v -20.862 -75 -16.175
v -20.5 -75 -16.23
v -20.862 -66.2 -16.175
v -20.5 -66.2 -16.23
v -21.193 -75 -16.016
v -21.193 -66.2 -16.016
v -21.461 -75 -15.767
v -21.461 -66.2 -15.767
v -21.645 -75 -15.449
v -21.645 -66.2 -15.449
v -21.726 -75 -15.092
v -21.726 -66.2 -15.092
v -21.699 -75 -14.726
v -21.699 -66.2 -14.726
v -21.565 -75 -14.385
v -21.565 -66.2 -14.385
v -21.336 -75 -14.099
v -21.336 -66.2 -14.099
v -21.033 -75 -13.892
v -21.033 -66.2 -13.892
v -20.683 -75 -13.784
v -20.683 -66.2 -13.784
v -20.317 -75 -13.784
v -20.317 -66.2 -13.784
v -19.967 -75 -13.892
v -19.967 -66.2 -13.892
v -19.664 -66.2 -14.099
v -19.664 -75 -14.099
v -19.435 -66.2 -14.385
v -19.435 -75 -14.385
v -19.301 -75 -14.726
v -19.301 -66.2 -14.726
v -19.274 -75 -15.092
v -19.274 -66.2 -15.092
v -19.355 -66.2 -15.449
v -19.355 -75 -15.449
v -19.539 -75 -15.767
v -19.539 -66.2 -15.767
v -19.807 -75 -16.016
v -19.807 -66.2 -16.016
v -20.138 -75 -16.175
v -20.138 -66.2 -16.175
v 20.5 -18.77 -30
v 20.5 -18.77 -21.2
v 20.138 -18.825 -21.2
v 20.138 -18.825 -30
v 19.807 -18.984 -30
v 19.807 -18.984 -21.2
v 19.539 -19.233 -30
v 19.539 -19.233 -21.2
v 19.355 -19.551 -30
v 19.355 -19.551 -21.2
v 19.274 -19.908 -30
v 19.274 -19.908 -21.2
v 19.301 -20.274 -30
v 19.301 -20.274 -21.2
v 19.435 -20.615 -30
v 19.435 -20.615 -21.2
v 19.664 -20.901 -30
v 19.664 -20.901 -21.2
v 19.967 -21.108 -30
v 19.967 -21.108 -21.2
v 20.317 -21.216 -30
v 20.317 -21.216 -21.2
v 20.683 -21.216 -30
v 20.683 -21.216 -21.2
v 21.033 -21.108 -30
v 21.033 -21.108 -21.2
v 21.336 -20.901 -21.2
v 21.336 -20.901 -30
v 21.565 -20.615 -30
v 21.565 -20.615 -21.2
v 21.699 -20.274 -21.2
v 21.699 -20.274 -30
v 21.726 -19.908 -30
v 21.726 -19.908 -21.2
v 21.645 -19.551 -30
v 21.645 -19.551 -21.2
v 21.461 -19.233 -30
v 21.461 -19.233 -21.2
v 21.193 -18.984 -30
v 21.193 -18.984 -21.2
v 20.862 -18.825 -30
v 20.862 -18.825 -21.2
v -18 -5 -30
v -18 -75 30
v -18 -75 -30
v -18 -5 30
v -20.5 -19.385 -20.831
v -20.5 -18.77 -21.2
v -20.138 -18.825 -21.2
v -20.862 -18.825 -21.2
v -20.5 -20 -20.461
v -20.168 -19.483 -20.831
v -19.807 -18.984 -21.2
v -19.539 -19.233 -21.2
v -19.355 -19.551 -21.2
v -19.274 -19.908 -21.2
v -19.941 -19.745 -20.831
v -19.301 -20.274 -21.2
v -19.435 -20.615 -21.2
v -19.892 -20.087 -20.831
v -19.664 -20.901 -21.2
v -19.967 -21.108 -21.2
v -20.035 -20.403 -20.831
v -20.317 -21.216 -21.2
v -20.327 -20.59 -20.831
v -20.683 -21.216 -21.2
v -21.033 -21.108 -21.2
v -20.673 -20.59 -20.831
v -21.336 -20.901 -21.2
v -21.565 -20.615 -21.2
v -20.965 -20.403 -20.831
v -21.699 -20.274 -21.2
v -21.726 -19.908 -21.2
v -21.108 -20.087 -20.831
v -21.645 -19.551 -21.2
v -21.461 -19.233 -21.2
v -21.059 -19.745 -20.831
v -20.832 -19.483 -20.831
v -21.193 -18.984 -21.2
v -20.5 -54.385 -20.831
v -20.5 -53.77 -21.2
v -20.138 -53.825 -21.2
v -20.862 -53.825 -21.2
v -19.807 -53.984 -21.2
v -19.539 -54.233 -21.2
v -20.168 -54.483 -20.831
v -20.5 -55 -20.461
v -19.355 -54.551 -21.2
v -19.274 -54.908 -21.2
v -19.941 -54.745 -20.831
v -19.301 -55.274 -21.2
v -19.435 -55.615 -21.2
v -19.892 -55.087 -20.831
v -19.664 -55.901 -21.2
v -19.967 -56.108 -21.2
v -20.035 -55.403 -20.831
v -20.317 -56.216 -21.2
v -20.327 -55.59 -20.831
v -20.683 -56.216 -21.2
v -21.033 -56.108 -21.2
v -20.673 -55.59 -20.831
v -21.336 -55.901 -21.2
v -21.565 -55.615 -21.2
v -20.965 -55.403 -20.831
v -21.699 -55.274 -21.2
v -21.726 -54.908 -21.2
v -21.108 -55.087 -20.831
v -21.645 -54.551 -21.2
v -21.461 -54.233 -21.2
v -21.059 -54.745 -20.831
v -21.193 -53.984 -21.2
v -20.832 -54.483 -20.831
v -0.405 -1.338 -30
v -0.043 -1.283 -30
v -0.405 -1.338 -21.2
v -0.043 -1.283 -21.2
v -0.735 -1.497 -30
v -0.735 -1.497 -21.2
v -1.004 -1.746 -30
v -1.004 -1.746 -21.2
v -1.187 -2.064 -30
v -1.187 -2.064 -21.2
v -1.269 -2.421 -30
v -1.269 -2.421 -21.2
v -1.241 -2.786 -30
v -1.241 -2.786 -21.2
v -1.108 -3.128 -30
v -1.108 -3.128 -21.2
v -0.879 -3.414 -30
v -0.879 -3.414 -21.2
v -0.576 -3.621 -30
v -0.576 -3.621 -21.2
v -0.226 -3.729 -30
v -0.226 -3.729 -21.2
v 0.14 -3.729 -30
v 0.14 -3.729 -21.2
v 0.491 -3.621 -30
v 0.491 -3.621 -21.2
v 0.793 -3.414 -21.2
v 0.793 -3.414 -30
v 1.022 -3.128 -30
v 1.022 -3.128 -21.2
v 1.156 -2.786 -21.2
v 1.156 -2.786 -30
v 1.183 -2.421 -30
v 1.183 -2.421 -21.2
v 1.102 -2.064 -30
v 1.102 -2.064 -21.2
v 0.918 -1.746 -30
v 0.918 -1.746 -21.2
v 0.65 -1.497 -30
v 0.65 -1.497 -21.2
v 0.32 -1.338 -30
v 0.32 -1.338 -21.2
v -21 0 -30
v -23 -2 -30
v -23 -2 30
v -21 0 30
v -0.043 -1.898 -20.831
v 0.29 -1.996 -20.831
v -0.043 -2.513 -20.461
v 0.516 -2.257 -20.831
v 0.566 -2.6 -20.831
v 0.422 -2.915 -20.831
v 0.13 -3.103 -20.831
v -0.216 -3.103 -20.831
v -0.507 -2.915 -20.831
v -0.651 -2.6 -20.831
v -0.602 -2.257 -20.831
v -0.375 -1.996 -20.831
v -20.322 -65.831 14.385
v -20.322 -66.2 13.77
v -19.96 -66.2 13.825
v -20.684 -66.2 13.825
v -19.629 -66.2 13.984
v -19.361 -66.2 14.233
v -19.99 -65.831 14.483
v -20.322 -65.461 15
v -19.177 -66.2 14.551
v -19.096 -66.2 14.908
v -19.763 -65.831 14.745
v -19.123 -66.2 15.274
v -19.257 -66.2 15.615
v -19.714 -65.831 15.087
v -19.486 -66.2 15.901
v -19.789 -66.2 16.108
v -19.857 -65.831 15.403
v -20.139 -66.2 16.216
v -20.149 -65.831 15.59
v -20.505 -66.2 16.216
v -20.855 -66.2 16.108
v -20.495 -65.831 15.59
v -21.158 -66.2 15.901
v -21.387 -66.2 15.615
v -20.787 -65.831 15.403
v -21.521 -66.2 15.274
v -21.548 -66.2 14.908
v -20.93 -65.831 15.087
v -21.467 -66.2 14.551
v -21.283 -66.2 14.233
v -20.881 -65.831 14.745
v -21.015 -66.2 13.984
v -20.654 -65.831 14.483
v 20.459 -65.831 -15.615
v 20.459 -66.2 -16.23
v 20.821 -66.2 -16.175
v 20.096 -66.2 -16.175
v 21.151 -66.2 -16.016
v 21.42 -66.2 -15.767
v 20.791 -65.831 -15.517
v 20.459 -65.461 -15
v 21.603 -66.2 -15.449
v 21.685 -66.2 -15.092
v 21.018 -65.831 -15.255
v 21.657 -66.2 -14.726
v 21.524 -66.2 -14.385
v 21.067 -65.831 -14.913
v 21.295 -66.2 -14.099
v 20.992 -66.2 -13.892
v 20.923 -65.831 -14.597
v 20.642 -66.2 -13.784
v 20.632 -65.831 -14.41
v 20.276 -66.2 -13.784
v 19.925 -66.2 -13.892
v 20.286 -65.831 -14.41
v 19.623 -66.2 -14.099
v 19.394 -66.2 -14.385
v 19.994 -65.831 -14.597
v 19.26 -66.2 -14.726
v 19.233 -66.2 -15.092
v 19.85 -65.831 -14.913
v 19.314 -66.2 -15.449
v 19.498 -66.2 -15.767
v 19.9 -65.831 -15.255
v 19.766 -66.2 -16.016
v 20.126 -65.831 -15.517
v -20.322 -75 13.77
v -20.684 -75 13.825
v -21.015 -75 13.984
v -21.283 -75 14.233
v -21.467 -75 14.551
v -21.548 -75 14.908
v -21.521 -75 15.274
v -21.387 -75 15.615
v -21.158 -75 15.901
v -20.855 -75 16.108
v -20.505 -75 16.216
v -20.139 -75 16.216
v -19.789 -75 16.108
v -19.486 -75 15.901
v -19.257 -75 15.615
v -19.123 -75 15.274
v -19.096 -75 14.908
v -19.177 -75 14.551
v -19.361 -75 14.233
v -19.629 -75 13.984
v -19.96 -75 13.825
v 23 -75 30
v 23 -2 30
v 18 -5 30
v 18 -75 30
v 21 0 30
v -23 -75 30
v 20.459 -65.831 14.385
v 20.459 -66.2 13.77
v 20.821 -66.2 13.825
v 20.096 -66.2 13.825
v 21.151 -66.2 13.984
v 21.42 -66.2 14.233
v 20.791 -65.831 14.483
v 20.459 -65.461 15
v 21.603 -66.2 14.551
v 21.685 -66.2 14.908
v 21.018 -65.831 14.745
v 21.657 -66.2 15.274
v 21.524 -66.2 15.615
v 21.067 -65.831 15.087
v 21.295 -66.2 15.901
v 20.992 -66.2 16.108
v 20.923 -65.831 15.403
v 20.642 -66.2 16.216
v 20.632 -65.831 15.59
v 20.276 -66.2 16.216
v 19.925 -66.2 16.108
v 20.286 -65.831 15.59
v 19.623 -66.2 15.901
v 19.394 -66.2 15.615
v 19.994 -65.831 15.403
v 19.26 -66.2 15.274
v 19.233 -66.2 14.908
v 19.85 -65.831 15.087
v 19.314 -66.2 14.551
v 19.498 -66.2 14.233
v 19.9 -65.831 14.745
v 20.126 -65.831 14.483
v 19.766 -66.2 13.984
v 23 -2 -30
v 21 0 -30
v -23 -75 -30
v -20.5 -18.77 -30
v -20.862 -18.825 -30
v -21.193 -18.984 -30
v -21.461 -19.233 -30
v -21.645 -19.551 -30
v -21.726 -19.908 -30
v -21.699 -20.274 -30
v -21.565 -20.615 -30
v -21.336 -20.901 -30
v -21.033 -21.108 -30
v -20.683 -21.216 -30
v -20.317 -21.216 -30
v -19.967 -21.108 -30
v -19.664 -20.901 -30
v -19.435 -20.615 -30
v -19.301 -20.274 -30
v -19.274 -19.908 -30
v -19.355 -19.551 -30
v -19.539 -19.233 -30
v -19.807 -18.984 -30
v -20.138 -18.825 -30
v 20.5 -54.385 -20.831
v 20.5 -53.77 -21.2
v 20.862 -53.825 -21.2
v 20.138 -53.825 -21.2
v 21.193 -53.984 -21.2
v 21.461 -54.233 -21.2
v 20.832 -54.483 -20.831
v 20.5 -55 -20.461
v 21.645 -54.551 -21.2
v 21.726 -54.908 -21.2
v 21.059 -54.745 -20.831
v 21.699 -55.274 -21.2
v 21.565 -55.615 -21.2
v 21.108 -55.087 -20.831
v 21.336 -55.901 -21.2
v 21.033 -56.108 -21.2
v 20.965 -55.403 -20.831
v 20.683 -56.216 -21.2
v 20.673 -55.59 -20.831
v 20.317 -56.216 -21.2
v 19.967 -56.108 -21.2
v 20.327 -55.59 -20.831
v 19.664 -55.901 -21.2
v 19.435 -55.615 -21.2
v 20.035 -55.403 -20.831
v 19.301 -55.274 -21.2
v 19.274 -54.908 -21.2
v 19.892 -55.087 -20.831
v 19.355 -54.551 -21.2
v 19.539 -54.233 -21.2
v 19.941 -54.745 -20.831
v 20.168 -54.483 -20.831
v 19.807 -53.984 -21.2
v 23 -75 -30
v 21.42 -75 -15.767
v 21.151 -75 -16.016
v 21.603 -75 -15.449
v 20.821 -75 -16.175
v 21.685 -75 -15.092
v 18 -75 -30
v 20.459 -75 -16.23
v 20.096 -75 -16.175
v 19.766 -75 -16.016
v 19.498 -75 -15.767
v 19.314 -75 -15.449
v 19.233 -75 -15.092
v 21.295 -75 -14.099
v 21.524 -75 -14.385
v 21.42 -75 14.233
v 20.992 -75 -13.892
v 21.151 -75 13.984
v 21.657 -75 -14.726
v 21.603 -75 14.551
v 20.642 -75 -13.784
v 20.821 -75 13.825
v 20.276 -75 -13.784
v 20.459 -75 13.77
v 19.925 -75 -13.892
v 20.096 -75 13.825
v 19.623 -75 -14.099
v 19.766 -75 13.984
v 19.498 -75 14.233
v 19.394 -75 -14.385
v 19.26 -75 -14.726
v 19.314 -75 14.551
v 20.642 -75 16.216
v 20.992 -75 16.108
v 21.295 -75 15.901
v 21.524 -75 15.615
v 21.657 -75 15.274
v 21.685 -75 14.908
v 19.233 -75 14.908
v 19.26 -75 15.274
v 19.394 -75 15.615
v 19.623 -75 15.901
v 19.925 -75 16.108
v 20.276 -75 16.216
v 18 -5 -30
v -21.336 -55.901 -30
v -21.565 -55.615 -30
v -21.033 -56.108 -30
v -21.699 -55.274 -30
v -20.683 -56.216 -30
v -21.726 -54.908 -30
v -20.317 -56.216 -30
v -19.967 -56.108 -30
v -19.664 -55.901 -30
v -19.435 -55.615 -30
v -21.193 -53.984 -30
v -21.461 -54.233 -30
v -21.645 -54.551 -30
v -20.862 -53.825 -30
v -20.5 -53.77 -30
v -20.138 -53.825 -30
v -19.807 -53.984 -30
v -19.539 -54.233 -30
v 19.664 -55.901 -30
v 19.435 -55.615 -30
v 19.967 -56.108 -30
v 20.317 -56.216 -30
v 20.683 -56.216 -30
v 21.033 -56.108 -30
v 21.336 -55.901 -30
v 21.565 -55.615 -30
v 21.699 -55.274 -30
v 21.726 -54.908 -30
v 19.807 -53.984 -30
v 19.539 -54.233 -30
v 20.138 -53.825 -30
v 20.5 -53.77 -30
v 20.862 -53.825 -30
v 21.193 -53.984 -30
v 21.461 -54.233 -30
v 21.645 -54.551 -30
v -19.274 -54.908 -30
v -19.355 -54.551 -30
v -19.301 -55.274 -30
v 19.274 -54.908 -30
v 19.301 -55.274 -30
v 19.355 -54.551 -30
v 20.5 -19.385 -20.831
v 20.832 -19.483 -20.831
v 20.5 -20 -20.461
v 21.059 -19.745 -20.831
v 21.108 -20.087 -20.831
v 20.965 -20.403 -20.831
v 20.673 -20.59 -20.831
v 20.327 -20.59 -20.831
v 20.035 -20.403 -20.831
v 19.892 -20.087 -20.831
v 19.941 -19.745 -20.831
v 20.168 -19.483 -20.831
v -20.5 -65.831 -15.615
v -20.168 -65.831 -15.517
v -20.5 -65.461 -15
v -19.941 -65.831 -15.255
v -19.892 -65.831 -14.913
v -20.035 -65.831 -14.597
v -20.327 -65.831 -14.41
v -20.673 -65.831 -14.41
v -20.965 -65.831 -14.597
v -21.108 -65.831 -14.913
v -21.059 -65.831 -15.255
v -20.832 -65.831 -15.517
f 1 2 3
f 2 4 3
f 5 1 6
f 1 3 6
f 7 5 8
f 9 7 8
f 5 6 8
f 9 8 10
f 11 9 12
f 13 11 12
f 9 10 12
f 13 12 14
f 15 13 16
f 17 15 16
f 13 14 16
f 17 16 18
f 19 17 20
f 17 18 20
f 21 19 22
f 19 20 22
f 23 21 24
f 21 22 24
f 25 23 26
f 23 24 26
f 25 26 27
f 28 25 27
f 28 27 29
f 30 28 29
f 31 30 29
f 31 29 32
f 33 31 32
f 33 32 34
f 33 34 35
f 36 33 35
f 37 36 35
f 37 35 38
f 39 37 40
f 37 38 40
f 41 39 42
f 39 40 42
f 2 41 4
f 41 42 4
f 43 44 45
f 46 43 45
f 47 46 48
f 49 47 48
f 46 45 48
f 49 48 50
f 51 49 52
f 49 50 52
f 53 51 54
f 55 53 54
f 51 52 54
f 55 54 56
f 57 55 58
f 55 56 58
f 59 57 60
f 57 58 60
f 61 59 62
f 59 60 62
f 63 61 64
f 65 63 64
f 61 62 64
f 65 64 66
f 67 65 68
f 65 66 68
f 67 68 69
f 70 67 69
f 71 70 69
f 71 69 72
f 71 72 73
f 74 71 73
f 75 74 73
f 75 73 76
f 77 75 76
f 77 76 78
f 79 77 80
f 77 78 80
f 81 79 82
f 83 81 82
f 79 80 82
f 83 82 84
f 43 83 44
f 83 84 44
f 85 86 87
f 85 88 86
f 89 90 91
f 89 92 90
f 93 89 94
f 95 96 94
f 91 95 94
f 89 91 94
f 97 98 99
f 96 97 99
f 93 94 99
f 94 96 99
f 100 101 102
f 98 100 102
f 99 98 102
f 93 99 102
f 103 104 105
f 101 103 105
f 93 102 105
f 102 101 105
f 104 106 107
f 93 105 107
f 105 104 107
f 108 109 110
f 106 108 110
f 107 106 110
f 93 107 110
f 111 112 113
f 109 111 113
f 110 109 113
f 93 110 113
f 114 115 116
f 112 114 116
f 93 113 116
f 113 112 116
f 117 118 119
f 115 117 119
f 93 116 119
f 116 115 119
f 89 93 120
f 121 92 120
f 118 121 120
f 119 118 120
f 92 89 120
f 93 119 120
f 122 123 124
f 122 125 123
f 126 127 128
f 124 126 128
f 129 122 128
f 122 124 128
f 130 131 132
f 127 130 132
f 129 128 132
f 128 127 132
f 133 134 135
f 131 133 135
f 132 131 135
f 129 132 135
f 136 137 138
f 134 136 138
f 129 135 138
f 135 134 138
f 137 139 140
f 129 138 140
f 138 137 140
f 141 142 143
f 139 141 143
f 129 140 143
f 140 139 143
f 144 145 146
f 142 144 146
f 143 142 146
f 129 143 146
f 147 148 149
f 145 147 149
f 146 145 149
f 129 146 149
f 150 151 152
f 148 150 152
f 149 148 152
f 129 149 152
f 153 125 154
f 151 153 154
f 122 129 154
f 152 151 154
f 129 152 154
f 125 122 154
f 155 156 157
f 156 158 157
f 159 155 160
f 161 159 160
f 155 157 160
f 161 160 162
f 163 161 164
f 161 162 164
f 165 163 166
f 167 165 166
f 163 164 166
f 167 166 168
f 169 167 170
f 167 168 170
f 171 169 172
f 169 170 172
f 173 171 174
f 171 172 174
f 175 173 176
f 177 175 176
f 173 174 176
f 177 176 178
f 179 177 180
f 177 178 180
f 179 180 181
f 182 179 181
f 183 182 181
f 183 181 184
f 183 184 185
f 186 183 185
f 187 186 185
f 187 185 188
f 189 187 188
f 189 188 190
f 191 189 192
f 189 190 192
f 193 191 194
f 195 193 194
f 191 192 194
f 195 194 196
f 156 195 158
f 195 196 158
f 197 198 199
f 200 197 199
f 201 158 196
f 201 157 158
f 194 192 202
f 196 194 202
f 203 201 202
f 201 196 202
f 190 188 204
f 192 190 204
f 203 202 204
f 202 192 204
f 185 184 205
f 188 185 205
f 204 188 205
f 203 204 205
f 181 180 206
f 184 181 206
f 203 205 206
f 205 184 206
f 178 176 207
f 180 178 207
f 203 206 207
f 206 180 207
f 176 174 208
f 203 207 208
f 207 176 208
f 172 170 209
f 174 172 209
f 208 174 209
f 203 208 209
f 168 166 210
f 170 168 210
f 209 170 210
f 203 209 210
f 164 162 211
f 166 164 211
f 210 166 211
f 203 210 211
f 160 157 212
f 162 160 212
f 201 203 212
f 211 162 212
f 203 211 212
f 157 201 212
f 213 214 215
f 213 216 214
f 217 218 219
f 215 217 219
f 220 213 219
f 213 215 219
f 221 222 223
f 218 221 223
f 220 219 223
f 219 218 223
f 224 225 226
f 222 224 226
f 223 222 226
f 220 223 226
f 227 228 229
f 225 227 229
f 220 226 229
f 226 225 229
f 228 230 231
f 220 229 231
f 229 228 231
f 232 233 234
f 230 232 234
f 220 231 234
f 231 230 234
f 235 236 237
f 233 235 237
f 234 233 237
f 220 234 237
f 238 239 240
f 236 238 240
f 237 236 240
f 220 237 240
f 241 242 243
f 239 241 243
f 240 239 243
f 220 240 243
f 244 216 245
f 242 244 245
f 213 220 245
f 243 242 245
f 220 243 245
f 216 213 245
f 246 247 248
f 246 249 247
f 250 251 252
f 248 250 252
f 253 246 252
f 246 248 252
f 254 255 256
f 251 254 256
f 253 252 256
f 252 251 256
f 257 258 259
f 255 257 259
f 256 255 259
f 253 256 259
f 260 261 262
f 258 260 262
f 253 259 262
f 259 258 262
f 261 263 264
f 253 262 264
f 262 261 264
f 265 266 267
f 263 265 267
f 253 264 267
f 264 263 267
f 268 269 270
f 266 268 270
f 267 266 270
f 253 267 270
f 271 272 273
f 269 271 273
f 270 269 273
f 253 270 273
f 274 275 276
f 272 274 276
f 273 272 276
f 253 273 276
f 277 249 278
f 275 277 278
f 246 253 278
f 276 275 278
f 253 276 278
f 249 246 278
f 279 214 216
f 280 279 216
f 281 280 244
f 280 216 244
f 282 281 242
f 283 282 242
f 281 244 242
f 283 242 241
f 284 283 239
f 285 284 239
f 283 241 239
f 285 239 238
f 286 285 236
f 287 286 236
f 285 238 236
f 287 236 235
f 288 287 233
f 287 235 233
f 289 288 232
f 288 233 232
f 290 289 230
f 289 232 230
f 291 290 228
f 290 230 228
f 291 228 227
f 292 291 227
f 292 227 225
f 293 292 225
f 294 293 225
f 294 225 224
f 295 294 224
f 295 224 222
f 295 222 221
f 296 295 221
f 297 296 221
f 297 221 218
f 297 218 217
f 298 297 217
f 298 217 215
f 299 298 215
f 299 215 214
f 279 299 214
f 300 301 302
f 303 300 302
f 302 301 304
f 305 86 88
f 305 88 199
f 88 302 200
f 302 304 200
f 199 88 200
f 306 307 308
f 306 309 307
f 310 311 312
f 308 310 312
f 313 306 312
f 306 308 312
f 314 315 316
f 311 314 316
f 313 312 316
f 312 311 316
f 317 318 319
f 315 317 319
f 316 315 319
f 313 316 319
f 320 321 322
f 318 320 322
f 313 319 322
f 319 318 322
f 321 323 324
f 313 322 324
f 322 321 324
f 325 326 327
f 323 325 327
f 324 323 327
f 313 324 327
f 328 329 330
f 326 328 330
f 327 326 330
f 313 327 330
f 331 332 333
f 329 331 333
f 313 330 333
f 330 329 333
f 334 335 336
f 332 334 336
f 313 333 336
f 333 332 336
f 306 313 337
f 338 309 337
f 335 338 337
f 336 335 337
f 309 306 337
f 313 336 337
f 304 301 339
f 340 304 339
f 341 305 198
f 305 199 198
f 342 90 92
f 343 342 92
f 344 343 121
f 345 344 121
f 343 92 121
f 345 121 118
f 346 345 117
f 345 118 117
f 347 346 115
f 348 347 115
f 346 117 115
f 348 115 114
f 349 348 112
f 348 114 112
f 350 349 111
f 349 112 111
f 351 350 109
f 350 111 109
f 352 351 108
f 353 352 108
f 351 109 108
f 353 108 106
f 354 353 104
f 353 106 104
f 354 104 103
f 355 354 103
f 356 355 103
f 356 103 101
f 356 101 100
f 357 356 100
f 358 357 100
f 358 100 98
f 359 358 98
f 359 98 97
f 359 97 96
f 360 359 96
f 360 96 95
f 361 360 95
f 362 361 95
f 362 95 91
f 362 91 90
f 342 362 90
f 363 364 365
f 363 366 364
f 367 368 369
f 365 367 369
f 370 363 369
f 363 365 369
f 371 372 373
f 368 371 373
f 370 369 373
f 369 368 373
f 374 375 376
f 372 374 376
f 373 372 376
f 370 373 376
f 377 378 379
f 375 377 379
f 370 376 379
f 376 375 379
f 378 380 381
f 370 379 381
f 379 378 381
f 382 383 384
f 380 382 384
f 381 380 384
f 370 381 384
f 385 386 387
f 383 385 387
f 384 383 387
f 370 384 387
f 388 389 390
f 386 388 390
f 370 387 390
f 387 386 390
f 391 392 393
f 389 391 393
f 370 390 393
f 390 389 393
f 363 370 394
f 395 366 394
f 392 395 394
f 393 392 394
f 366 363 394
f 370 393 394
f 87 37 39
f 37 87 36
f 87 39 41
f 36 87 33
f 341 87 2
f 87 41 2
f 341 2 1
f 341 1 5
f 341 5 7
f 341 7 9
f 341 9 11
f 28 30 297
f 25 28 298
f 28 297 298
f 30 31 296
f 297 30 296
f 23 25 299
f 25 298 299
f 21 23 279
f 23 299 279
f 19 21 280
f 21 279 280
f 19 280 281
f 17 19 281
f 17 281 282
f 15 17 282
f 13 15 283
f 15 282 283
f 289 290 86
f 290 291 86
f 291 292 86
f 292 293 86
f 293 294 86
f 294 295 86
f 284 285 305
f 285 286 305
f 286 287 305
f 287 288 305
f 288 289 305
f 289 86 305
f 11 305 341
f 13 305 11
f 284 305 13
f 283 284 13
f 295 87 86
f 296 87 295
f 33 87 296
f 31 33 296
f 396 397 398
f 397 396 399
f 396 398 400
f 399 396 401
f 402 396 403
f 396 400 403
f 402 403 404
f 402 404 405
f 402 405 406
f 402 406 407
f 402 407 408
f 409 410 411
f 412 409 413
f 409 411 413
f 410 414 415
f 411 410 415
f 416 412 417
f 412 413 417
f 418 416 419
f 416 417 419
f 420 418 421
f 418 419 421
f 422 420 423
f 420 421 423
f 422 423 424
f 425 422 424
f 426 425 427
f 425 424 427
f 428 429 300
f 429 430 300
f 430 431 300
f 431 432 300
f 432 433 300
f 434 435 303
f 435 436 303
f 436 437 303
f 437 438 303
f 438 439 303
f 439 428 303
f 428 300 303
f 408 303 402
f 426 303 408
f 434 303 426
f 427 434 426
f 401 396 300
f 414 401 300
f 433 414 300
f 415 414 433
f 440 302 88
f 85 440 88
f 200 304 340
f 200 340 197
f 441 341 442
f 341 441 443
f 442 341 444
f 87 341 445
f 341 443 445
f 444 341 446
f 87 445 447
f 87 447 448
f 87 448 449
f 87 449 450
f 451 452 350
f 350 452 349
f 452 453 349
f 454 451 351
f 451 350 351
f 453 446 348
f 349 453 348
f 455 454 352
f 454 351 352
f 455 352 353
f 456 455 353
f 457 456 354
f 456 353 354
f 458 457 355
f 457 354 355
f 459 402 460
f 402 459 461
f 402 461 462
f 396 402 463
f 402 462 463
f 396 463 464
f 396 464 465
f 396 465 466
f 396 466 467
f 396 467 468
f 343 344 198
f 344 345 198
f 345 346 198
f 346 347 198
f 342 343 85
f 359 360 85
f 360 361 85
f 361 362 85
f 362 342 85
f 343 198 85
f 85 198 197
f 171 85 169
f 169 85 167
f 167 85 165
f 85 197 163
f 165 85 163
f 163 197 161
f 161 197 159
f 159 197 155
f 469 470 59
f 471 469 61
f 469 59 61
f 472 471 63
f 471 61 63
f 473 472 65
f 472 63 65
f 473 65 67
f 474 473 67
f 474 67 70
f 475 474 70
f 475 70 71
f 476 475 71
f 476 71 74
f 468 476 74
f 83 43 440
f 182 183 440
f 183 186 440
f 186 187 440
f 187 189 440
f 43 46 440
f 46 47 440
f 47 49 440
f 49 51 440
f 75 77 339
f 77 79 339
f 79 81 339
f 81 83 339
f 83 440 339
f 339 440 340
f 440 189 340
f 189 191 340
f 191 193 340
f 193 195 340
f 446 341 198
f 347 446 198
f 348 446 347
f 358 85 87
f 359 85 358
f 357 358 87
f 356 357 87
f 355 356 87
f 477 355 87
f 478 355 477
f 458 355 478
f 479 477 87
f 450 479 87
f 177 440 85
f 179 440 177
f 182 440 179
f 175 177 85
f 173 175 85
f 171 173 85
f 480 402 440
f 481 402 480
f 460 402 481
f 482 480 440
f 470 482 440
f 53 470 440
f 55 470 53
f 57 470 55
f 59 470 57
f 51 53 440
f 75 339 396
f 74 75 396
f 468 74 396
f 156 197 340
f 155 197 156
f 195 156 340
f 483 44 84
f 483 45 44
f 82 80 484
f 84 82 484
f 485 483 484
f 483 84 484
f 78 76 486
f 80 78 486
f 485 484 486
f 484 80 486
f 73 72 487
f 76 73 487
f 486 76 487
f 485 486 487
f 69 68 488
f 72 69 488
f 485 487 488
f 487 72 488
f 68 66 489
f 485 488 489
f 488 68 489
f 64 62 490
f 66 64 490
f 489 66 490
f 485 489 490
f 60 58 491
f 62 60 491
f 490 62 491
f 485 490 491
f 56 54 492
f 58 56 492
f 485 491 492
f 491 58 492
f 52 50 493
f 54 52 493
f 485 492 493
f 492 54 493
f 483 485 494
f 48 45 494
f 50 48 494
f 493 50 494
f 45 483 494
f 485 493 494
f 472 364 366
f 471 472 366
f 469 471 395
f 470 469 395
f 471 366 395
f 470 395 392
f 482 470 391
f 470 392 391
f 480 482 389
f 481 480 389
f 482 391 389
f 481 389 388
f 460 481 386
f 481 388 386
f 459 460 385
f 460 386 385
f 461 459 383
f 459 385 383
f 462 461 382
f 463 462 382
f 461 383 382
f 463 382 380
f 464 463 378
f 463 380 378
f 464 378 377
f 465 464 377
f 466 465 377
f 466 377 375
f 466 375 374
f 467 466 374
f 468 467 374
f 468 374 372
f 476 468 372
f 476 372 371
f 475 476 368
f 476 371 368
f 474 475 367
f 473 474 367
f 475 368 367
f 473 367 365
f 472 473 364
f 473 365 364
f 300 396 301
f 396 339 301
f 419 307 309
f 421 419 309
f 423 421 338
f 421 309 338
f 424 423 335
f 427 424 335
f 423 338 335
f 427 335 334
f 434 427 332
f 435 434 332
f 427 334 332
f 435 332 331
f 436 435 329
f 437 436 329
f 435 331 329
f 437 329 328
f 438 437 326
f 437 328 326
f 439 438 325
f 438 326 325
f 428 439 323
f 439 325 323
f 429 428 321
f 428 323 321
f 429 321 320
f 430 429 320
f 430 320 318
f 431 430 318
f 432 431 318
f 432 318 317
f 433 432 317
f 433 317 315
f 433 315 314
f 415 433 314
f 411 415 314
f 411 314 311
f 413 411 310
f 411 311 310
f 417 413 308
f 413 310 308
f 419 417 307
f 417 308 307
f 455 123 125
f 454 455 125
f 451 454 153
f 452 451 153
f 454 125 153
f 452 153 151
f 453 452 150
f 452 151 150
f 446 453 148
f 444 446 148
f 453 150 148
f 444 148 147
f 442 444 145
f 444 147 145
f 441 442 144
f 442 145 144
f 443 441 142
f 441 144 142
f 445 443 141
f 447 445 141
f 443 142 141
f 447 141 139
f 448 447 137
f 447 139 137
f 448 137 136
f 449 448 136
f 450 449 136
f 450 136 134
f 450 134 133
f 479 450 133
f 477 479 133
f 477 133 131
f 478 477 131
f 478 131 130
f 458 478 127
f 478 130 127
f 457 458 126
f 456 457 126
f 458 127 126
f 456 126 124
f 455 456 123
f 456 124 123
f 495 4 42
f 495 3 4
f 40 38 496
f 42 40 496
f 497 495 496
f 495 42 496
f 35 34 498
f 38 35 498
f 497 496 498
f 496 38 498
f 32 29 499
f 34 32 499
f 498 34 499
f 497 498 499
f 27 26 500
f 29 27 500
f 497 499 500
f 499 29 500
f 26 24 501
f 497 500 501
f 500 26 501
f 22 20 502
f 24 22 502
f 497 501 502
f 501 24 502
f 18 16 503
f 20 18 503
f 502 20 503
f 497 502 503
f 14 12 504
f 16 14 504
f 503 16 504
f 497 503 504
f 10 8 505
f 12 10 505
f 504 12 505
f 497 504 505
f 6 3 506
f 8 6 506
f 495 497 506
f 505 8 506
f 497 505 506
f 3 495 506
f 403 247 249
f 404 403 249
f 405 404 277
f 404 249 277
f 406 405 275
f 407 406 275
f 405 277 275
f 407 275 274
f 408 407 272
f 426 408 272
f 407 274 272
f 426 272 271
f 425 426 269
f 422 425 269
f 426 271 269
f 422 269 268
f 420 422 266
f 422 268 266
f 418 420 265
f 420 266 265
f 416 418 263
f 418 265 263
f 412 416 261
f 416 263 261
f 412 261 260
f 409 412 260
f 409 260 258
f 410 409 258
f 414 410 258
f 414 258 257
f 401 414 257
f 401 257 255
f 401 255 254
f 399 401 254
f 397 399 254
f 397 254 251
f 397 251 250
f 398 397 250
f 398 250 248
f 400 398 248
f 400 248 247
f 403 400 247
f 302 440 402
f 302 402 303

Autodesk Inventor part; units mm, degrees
ref_plane "YZ Plane" through (0, 0, 0) normal (1, 0, 0) x (0, 1, 0)
ref_plane "XZ Plane" through (0, 0, 0) normal (0, 1, 0) x (-1, 0, 0)
sketch "Эскиз1" plane through (0, 0, 0) normal (0, 1, 0) x (-1, 0, 0)
  line L0 (-23, 30) -> (23, 30)
  line L1 (23, 30) -> (23, -30)
  line L2 (23, -30) -> (-23, -30)
  line L3 (-23, -30) -> (-23, 30)
  line L4 (-18, 30) -> (18, 30)
  line L5 (18, 30) -> (18, -30)
  line L6 (18, -30) -> (-18, -30)
  line L7 (-18, -30) -> (-18, 30)
  point P0 (0, 0)
  point P1 (-18, 30)
  point P2 (-18, -30)
  dimension "d0" = 46
  dimension "d2" = 36
  dimension "d3" = 60
  dimension "d14" = 5
extrude "Выдавливание3" add sketch "Эскиз1" against normal blind 5 contours L0 L5 L2 L7
extrude "Выдавливание4" add sketch "Эскиз1" against normal blind 75 contours L0 L7 L2 L3 | L0 L1 L2 L5
ref_plane "РабПлоскость5" through (0, -2.5, 0) normal (0, 1, 0) x (-1, 0, 0)
sketch "Эскиз3" plane through (0, -75, 0) normal (0, -1, 0) x (1, 0, 0)
  line L0 (-18, 30) -> (-23, 30) projected
  line L1 (-23, -30) -> (-18, -30) projected
  point P0 (0, 0)
  point P1 (-20.322, 15)
  point P2 (-20.4927, -15)
  point P3 (20.6897, -15.1643)
  dimension "d59" = 15
  dimension "d60" = 15
sketch "Эскиз4" plane through (0, -75, 0) normal (0, -1, 0) x (1, 0, 0)
  line L0 (-23, -30) -> (-18, -30) projected
  line L1 (-18, -30) -> (-18, 30) projected
  point P0 (0, 0)
  point P1 (-20.5, -15)
  dimension "d43" = 15
  dimension "d44" = 2.5
hole "Отверстие3" at (-20.5, -75, -15) direction (0, 1, 0) diameter 2.459 depth 8.8 tip angle 118 thread size "M3x0.5" class "6H" standard "ISO Metric profile"
hole "Отверстие4" at (-20.322, -75, 15) direction (0, 1, 0) diameter 2.459 depth 8.8 tip angle 118 thread size "M3x0.5" class "6H" standard "ISO Metric profile"
sketch "Эскиз5" plane through (0, -75, 0) normal (0, -1, 0) x (1, 0, 0)
  circle A0 centre (-20.322, 15) radius 1.2295 construction
  circle A1 centre (-20.5, -15) radius 1.2295 projected
  point P0 (0, 0)
  point P1 (20.4588, 15)
  point P2 (20.4588, -15)
hole "Отверстие5" at (20.4588, -75, 15) at (20.4588, -75, -15) direction (0, 1, 0) diameter 2.459 depth 8.8 tip angle 118 thread size "M3x0.5" class "6H" standard "ISO Metric profile"
sketch "Эскиз9" plane through (23, 0, -30) normal (0, 0, -1) x (-1, 0, 0)
  point P0 (23, 0)
  point P1 (23.0428, -2.5128)
hole "Отверстие7" at (-0.0428, -2.5128, -30) direction (0, 0, 1) diameter 2.459 depth 8.8 tip angle 118 thread size "M3x0.5" class "6H" standard "ISO Metric profile"
sketch "Эскиз8" plane through (23, 0, -30) normal (0, 0, -1) x (-1, 0, 0)
  line L0 (0, 0) -> (0, -75) projected
  line L1 (0, 0) -> (46, 0) construction
  line L2 (46, 0) -> (46, -75) projected
  line L3 (5, -5) -> (5, -75) projected
  line L4 (3.7707, -75) -> (1.3117, -75) projected
  line L5 (2.5, -75) -> (2.5, 0) construction
  line L6 (46, 0) -> (46, -75) construction
  line L7 (46, -2.5) -> (0, -2.5) construction
  line L8 (44.7295, -75) -> (42.2705, -75) construction
  line L9 (43.5, -75) -> (43.5, 0) construction
  line L10 (2.5, -20) -> (43.5, -20) construction
  line L11 (43.5, -20) -> (43.5, -55) construction
  line L12 (43.5, -55) -> (2.5, -55) construction
  line L13 (2.5, -55) -> (2.5, -20) construction
  line L14 (0, -75) -> (0, 0) projected
  line L15 (0, 0) -> (46, 0) projected
  line L16 (46, 0) -> (46, -75) projected
  line L17 (46, -75) -> (41, -75) projected
  line L18 (41, -75) -> (41, -5) projected
  line L19 (41, -5) -> (5, -5) projected
  line L20 (5, -5) -> (5, -75) projected
  line L21 (5, -75) -> (0, -75) projected
  circle A0 centre (23.0428, -2.5128) radius 1.2295 projected
  point P0 (23, 0)
  dimension "d76" = 5
  dimension "d84" = 35
hole "Отверстие9" at (20.5, -55, -30) direction (0, 0, 1) diameter 2.459 depth 8.8 tip angle 118 thread size "M3x0.5" class "6H" standard "ISO Metric profile"
hole "Отверстие10" at (-20.5, -55, -30) at (20.5, -20, -30) direction (0, 0, 1) diameter 2.459 depth 8.8 tip angle 118 thread size "M3x0.5" class "6H" standard "ISO Metric profile"
hole "Отверстие11" at (-20.5, -20, -30) direction (0, 0, 1) diameter 2.459 depth 8.8 tip angle 118 thread size "M3x0.5" class "6H" standard "ISO Metric profile"
chamfer "Фаска1" distance 2 angle 45 2 edges at (23, 0, 0) (-23, 0, 0)
equation "\"Радиус_гибки\" = Толщина"
equation "\"Ширина_просечки\" = Толщина"
equation "\"Глубина_просечки\" = 0.5 * Толщина"
equation "\"Радиус_перехода\" = Радиус_гибки"
equation "\"Радиус_Якоби\" = Радиус_гибки"
equation "\"Размер_зазора\" = Толщина"
equation "\"Толщина\" = 5"
properties part number "magnetGuide" material "Железо, мягкое"
